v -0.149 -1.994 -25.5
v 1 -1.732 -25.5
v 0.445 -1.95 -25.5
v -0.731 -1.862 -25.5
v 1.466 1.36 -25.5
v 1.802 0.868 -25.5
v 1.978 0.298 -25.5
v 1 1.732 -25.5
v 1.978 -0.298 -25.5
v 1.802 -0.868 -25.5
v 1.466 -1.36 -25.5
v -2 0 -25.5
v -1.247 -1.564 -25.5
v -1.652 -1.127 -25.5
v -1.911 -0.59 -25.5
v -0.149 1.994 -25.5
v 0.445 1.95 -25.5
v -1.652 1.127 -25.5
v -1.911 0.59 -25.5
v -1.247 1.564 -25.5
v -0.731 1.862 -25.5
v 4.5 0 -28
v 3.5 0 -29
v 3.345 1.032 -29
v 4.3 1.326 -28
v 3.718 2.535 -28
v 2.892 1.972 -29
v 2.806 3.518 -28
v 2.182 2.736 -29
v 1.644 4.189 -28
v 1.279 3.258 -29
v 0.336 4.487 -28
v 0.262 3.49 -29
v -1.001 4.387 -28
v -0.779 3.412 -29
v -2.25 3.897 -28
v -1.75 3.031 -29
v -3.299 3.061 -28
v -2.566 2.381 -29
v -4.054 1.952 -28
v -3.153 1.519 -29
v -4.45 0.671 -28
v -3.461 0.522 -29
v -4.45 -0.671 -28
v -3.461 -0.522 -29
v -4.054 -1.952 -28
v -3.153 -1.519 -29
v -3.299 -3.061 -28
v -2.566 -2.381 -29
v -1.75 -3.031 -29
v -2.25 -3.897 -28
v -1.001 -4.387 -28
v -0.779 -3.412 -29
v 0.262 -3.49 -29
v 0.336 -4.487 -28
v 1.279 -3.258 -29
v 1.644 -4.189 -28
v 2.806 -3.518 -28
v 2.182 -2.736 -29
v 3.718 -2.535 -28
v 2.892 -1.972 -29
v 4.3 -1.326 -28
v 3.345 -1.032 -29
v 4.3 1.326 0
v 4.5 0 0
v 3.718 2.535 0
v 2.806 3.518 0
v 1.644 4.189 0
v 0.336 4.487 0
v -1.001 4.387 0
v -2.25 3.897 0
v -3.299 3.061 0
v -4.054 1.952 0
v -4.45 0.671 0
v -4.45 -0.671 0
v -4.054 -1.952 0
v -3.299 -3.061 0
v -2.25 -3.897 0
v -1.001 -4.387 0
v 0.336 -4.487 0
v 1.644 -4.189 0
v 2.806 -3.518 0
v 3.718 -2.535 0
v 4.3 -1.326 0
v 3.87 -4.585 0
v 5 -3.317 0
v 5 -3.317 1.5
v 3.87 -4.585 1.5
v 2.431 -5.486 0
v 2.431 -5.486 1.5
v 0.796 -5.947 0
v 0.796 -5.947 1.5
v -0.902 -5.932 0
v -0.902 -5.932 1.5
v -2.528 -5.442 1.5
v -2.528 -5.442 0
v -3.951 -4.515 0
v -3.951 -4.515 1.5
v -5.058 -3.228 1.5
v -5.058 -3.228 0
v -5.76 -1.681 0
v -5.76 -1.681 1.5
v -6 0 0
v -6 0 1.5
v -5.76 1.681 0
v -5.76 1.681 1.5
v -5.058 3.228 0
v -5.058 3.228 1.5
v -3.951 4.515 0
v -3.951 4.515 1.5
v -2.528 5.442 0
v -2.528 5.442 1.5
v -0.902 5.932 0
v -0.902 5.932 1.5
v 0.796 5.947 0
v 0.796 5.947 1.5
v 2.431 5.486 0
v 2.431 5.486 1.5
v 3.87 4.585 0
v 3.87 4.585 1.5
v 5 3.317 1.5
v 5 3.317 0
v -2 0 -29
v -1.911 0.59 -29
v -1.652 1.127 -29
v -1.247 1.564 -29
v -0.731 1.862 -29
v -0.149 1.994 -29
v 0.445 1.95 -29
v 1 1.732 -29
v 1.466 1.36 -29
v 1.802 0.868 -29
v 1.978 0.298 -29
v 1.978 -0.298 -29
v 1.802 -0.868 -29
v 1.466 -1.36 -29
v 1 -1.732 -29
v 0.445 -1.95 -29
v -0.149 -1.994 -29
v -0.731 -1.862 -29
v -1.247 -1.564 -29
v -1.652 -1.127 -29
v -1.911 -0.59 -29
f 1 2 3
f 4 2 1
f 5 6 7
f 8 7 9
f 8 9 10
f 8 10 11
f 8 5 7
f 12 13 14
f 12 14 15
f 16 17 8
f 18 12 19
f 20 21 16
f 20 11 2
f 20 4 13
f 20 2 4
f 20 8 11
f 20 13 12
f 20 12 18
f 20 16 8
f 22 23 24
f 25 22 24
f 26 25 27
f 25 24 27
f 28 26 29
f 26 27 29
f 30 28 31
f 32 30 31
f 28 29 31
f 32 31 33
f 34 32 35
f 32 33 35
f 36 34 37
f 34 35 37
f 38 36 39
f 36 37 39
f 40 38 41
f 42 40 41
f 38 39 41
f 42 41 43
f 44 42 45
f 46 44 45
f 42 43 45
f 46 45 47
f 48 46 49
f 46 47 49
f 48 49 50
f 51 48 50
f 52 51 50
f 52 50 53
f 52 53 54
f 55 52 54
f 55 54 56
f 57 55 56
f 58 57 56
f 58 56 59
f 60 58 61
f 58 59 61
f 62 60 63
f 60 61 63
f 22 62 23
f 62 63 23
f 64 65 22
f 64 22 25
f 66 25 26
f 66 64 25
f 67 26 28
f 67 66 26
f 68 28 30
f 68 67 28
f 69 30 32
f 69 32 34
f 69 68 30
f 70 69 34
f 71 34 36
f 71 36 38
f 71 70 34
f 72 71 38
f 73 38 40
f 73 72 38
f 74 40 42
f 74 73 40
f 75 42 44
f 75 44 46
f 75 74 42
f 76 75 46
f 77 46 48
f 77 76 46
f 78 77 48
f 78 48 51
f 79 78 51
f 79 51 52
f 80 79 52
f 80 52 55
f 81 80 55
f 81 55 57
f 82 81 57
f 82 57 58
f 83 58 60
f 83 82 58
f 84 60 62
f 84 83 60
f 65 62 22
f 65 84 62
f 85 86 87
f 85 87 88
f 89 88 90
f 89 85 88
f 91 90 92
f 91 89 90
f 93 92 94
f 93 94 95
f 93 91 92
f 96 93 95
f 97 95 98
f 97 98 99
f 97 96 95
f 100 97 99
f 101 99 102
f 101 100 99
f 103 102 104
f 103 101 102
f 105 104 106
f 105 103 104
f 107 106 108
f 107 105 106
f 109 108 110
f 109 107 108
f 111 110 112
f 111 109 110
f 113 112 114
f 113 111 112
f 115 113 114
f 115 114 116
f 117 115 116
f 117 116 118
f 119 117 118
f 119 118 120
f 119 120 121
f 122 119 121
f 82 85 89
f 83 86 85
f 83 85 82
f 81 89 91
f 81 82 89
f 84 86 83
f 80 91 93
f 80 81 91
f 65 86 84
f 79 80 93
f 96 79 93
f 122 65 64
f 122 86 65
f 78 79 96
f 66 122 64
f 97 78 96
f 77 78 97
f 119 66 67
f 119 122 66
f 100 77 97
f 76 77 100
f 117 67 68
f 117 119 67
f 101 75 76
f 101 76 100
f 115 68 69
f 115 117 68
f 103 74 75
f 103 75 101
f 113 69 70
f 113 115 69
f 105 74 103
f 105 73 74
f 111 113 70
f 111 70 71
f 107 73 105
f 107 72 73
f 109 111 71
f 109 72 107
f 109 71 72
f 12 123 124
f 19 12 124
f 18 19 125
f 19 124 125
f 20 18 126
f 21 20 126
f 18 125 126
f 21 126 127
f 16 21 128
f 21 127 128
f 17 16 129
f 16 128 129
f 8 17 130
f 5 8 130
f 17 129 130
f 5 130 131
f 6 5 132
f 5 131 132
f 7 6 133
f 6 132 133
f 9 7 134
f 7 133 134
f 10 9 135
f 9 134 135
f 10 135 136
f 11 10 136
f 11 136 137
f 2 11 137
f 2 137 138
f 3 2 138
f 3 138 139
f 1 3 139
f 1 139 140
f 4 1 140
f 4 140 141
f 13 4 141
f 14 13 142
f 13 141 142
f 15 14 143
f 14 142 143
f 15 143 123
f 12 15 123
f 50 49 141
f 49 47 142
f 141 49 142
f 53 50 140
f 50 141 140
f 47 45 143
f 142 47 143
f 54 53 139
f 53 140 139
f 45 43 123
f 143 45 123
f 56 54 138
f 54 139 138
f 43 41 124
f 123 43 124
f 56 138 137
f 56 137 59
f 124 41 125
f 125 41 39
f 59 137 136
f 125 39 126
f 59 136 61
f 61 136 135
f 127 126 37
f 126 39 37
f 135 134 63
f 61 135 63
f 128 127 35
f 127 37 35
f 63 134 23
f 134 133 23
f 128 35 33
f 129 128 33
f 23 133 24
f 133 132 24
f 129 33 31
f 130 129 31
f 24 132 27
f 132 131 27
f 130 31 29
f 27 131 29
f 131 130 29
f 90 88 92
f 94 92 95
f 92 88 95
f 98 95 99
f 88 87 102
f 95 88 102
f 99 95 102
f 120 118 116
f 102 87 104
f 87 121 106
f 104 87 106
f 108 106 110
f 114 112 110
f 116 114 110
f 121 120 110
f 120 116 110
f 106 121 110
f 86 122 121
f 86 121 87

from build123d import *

# Parameters (mm, degrees)
ESQUISSE_CYLINDRE_R = 4.5
CYLINDRE_DEPTH      = 29
EPAULEMENT_DEPTH    = 1.5
ESQUISSE_TROU_R     = 2
TROU_DEPTH          = 3.5
CHANFREIN1_SIZE     = 1


with BuildPart() as part:
    # Esquisse_cylindre → Cylindre (new body)
    with BuildSketch(Plane.XY):
        Circle(ESQUISSE_CYLINDRE_R)
    extrude(amount=-CYLINDRE_DEPTH)

    # Esquisse_épaulement → Epaulement (add)
    with BuildSketch(Plane.XY):
        with BuildLine():
            Line((5, 3.31662479), (5, -3.31662479))
            ThreePointArc((5, -3.31662479), (-6, 0), (5, 3.31662479))
        make_face()
    extrude(amount=EPAULEMENT_DEPTH)

    # Esquisse_trou → Trou (cut)
    with BuildSketch(Plane(origin=(0, 0, -29), x_dir=(-1, 0, 0), z_dir=(0, 0, -1))):
        Circle(ESQUISSE_TROU_R)
    extrude(amount=-TROU_DEPTH, mode=Mode.SUBTRACT)

    # Chanfrein1
    chanfrein1_edges = [part.edges().sort_by_distance(p)[0] for p in [
        (-4.5, 0, -29),
    ]]
    chamfer(chanfrein1_edges, length=CHANFREIN1_SIZE)


solid = part.part
